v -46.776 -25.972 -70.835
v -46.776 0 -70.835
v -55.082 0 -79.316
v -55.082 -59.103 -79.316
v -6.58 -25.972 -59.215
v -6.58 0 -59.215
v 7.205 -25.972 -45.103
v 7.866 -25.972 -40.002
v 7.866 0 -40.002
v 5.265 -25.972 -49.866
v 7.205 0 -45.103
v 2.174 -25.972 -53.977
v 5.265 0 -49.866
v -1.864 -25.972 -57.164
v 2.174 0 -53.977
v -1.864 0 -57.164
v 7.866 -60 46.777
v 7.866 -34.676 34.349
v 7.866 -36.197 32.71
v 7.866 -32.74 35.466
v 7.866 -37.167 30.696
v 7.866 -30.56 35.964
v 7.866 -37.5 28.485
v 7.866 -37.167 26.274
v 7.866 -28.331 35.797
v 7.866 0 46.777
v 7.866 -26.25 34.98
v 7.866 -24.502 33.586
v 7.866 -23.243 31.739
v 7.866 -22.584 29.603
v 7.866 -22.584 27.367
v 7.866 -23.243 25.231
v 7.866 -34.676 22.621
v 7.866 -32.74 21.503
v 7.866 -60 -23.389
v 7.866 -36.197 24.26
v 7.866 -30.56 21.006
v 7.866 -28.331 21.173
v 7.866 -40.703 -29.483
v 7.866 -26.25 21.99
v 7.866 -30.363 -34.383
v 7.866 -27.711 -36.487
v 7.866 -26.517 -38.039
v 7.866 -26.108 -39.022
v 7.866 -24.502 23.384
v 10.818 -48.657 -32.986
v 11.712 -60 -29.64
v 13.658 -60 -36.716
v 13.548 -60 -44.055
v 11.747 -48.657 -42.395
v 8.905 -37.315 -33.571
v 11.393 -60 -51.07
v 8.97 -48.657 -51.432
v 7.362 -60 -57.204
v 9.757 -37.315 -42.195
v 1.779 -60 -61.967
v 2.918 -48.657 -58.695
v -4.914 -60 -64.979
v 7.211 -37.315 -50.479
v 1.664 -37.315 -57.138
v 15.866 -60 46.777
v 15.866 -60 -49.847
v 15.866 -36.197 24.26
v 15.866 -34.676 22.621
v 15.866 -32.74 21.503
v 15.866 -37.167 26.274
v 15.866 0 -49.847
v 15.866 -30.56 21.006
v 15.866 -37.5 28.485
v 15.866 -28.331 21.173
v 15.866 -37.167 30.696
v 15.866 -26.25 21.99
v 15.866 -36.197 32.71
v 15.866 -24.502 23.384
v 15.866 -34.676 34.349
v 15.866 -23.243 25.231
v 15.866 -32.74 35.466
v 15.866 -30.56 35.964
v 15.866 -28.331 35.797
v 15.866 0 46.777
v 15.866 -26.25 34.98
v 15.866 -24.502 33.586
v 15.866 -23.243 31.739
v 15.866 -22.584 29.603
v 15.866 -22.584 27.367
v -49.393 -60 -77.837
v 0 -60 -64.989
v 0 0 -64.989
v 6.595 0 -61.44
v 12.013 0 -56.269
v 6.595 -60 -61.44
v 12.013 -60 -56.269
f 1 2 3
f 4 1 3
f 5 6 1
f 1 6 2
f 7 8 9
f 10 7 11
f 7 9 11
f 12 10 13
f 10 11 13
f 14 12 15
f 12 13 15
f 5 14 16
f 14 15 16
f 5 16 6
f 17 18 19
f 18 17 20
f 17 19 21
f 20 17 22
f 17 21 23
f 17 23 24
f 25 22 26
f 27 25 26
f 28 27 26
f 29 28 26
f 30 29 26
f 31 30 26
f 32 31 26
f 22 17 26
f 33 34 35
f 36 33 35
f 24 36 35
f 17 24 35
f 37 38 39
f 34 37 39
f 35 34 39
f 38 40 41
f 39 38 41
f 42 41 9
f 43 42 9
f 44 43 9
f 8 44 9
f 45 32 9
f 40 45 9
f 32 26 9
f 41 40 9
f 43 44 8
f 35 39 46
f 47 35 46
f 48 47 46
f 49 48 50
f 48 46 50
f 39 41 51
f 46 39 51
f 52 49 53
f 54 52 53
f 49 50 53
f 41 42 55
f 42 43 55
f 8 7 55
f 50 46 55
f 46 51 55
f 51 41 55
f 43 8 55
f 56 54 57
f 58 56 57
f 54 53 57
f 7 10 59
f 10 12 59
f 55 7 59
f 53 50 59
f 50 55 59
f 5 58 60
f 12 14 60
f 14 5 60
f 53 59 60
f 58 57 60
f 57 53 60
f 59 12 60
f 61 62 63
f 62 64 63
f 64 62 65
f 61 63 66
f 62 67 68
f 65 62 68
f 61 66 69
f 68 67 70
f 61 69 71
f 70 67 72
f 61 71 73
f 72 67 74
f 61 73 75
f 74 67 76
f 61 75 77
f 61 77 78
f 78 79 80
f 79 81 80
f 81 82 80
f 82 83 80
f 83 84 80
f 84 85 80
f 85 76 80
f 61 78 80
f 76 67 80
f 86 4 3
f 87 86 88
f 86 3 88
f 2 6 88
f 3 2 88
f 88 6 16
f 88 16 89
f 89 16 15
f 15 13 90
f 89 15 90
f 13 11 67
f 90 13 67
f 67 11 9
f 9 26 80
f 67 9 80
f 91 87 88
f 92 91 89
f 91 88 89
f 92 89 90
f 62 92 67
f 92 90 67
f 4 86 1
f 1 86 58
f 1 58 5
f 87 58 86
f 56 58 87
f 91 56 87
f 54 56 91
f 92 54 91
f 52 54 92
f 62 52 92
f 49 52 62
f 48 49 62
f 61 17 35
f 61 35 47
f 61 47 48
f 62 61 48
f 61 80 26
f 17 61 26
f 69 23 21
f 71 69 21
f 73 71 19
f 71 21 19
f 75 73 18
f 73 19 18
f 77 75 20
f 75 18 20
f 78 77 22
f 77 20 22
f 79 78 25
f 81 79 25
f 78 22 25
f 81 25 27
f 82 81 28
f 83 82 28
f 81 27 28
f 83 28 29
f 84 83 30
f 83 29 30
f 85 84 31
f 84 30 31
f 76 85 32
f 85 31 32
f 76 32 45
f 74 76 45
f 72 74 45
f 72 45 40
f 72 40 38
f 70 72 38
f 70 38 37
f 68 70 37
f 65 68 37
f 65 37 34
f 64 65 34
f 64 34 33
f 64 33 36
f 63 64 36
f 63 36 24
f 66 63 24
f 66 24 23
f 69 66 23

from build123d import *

# Parameters (mm, degrees)
F1_DEPTH    = 60
F2_T1_DEPTH = 130.2639714598
F2_T4_ANGLE = 327.2570469478
F3_R        = 7.5
F4_DEPTH    = 25


# Not quite as in the source:
# - a fillet or chamfer that OpenCascade refuses, or shapes differently, is made with other operations: its cross-section is extruded or revolved along the edge and cut away or added


with BuildPart() as f1:
    # F0 (on Front) → F1 (new body)
    with BuildSketch(Plane.XZ):
        with BuildLine():
            Line((15.8661792875, 46.7765345339), (7.8661792875, 46.7765345339))
            Line((7.8661792875, 46.7765345339), (7.8661792875, -40.0019907292))
            ThreePointArc((7.8661792875, -40.0019907292), (3.8517652045, -52.021185498), (-6.5799250014, -59.2153777921))
            Line((-6.5799250014, -59.2153777921), (-46.7759604719, -70.834598717))
            Line((-46.7759604719, -70.834598717), (-55.08180854, -79.3164507385))
            Line((-55.08180854, -79.3164507385), (0, -64.9890005589))
            ThreePointArc((0, -64.9890005589), (9.4773105279, -59.0361843334), (15.8661792875, -49.8471804794))
            Line((15.8661792875, -49.8471804794), (15.8661792875, -40.0019907292))
            Line((15.8661792875, -40.0019907292), (15.8661792875, 46.7765345339))
        make_face()
    extrude(amount=F1_DEPTH)

    # F2: chamfer of 6 x 34.0276909177 on 2 edges, made by hand

    # F2_s2 → F2_t1 (cut)
    with BuildSketch(Plane(origin=(-21.8695743552, 0, -6.3217034464), x_dir=(0, 1, 0), z_dir=(-0.9606693531, 0, -0.2776947856))):
        Polygon((-60, 61.0591878178), (-25.9723090823, 55.0591878178), (-60, 55.0591878178), align=None)
    extrude(amount=F2_T1_DEPTH, mode=Mode.SUBTRACT)

    # F2_s3 → F2_t4 (revolve, cut)
    with BuildSketch(Plane(origin=(-0.1774752696, 0, 0.0529760926), x_dir=(0, 1, 0), z_dir=(0.9582213809, 0, -0.2860275953))):
        Polygon((-60, -67.8013703537), (-25.9723090823, -61.8013703537), (-60, -61.8013703537), align=None)
    revolve(axis=Axis((-12.1338207125, -60, -40.0019907292), (0, 1, 0)), revolution_arc=F2_T4_ANGLE, mode=Mode.SUBTRACT)

    # F3 (on face) → F4 (cut)
    with BuildSketch(Plane(origin=(7.8661792875, 0, 0), x_dir=(0, -1, 0), z_dir=(-1, 0, 0))):
        with Locations((30, 28.4848585725)):
            Circle(F3_R)
    extrude(amount=-F4_DEPTH, mode=Mode.SUBTRACT)


solid = f1.part
